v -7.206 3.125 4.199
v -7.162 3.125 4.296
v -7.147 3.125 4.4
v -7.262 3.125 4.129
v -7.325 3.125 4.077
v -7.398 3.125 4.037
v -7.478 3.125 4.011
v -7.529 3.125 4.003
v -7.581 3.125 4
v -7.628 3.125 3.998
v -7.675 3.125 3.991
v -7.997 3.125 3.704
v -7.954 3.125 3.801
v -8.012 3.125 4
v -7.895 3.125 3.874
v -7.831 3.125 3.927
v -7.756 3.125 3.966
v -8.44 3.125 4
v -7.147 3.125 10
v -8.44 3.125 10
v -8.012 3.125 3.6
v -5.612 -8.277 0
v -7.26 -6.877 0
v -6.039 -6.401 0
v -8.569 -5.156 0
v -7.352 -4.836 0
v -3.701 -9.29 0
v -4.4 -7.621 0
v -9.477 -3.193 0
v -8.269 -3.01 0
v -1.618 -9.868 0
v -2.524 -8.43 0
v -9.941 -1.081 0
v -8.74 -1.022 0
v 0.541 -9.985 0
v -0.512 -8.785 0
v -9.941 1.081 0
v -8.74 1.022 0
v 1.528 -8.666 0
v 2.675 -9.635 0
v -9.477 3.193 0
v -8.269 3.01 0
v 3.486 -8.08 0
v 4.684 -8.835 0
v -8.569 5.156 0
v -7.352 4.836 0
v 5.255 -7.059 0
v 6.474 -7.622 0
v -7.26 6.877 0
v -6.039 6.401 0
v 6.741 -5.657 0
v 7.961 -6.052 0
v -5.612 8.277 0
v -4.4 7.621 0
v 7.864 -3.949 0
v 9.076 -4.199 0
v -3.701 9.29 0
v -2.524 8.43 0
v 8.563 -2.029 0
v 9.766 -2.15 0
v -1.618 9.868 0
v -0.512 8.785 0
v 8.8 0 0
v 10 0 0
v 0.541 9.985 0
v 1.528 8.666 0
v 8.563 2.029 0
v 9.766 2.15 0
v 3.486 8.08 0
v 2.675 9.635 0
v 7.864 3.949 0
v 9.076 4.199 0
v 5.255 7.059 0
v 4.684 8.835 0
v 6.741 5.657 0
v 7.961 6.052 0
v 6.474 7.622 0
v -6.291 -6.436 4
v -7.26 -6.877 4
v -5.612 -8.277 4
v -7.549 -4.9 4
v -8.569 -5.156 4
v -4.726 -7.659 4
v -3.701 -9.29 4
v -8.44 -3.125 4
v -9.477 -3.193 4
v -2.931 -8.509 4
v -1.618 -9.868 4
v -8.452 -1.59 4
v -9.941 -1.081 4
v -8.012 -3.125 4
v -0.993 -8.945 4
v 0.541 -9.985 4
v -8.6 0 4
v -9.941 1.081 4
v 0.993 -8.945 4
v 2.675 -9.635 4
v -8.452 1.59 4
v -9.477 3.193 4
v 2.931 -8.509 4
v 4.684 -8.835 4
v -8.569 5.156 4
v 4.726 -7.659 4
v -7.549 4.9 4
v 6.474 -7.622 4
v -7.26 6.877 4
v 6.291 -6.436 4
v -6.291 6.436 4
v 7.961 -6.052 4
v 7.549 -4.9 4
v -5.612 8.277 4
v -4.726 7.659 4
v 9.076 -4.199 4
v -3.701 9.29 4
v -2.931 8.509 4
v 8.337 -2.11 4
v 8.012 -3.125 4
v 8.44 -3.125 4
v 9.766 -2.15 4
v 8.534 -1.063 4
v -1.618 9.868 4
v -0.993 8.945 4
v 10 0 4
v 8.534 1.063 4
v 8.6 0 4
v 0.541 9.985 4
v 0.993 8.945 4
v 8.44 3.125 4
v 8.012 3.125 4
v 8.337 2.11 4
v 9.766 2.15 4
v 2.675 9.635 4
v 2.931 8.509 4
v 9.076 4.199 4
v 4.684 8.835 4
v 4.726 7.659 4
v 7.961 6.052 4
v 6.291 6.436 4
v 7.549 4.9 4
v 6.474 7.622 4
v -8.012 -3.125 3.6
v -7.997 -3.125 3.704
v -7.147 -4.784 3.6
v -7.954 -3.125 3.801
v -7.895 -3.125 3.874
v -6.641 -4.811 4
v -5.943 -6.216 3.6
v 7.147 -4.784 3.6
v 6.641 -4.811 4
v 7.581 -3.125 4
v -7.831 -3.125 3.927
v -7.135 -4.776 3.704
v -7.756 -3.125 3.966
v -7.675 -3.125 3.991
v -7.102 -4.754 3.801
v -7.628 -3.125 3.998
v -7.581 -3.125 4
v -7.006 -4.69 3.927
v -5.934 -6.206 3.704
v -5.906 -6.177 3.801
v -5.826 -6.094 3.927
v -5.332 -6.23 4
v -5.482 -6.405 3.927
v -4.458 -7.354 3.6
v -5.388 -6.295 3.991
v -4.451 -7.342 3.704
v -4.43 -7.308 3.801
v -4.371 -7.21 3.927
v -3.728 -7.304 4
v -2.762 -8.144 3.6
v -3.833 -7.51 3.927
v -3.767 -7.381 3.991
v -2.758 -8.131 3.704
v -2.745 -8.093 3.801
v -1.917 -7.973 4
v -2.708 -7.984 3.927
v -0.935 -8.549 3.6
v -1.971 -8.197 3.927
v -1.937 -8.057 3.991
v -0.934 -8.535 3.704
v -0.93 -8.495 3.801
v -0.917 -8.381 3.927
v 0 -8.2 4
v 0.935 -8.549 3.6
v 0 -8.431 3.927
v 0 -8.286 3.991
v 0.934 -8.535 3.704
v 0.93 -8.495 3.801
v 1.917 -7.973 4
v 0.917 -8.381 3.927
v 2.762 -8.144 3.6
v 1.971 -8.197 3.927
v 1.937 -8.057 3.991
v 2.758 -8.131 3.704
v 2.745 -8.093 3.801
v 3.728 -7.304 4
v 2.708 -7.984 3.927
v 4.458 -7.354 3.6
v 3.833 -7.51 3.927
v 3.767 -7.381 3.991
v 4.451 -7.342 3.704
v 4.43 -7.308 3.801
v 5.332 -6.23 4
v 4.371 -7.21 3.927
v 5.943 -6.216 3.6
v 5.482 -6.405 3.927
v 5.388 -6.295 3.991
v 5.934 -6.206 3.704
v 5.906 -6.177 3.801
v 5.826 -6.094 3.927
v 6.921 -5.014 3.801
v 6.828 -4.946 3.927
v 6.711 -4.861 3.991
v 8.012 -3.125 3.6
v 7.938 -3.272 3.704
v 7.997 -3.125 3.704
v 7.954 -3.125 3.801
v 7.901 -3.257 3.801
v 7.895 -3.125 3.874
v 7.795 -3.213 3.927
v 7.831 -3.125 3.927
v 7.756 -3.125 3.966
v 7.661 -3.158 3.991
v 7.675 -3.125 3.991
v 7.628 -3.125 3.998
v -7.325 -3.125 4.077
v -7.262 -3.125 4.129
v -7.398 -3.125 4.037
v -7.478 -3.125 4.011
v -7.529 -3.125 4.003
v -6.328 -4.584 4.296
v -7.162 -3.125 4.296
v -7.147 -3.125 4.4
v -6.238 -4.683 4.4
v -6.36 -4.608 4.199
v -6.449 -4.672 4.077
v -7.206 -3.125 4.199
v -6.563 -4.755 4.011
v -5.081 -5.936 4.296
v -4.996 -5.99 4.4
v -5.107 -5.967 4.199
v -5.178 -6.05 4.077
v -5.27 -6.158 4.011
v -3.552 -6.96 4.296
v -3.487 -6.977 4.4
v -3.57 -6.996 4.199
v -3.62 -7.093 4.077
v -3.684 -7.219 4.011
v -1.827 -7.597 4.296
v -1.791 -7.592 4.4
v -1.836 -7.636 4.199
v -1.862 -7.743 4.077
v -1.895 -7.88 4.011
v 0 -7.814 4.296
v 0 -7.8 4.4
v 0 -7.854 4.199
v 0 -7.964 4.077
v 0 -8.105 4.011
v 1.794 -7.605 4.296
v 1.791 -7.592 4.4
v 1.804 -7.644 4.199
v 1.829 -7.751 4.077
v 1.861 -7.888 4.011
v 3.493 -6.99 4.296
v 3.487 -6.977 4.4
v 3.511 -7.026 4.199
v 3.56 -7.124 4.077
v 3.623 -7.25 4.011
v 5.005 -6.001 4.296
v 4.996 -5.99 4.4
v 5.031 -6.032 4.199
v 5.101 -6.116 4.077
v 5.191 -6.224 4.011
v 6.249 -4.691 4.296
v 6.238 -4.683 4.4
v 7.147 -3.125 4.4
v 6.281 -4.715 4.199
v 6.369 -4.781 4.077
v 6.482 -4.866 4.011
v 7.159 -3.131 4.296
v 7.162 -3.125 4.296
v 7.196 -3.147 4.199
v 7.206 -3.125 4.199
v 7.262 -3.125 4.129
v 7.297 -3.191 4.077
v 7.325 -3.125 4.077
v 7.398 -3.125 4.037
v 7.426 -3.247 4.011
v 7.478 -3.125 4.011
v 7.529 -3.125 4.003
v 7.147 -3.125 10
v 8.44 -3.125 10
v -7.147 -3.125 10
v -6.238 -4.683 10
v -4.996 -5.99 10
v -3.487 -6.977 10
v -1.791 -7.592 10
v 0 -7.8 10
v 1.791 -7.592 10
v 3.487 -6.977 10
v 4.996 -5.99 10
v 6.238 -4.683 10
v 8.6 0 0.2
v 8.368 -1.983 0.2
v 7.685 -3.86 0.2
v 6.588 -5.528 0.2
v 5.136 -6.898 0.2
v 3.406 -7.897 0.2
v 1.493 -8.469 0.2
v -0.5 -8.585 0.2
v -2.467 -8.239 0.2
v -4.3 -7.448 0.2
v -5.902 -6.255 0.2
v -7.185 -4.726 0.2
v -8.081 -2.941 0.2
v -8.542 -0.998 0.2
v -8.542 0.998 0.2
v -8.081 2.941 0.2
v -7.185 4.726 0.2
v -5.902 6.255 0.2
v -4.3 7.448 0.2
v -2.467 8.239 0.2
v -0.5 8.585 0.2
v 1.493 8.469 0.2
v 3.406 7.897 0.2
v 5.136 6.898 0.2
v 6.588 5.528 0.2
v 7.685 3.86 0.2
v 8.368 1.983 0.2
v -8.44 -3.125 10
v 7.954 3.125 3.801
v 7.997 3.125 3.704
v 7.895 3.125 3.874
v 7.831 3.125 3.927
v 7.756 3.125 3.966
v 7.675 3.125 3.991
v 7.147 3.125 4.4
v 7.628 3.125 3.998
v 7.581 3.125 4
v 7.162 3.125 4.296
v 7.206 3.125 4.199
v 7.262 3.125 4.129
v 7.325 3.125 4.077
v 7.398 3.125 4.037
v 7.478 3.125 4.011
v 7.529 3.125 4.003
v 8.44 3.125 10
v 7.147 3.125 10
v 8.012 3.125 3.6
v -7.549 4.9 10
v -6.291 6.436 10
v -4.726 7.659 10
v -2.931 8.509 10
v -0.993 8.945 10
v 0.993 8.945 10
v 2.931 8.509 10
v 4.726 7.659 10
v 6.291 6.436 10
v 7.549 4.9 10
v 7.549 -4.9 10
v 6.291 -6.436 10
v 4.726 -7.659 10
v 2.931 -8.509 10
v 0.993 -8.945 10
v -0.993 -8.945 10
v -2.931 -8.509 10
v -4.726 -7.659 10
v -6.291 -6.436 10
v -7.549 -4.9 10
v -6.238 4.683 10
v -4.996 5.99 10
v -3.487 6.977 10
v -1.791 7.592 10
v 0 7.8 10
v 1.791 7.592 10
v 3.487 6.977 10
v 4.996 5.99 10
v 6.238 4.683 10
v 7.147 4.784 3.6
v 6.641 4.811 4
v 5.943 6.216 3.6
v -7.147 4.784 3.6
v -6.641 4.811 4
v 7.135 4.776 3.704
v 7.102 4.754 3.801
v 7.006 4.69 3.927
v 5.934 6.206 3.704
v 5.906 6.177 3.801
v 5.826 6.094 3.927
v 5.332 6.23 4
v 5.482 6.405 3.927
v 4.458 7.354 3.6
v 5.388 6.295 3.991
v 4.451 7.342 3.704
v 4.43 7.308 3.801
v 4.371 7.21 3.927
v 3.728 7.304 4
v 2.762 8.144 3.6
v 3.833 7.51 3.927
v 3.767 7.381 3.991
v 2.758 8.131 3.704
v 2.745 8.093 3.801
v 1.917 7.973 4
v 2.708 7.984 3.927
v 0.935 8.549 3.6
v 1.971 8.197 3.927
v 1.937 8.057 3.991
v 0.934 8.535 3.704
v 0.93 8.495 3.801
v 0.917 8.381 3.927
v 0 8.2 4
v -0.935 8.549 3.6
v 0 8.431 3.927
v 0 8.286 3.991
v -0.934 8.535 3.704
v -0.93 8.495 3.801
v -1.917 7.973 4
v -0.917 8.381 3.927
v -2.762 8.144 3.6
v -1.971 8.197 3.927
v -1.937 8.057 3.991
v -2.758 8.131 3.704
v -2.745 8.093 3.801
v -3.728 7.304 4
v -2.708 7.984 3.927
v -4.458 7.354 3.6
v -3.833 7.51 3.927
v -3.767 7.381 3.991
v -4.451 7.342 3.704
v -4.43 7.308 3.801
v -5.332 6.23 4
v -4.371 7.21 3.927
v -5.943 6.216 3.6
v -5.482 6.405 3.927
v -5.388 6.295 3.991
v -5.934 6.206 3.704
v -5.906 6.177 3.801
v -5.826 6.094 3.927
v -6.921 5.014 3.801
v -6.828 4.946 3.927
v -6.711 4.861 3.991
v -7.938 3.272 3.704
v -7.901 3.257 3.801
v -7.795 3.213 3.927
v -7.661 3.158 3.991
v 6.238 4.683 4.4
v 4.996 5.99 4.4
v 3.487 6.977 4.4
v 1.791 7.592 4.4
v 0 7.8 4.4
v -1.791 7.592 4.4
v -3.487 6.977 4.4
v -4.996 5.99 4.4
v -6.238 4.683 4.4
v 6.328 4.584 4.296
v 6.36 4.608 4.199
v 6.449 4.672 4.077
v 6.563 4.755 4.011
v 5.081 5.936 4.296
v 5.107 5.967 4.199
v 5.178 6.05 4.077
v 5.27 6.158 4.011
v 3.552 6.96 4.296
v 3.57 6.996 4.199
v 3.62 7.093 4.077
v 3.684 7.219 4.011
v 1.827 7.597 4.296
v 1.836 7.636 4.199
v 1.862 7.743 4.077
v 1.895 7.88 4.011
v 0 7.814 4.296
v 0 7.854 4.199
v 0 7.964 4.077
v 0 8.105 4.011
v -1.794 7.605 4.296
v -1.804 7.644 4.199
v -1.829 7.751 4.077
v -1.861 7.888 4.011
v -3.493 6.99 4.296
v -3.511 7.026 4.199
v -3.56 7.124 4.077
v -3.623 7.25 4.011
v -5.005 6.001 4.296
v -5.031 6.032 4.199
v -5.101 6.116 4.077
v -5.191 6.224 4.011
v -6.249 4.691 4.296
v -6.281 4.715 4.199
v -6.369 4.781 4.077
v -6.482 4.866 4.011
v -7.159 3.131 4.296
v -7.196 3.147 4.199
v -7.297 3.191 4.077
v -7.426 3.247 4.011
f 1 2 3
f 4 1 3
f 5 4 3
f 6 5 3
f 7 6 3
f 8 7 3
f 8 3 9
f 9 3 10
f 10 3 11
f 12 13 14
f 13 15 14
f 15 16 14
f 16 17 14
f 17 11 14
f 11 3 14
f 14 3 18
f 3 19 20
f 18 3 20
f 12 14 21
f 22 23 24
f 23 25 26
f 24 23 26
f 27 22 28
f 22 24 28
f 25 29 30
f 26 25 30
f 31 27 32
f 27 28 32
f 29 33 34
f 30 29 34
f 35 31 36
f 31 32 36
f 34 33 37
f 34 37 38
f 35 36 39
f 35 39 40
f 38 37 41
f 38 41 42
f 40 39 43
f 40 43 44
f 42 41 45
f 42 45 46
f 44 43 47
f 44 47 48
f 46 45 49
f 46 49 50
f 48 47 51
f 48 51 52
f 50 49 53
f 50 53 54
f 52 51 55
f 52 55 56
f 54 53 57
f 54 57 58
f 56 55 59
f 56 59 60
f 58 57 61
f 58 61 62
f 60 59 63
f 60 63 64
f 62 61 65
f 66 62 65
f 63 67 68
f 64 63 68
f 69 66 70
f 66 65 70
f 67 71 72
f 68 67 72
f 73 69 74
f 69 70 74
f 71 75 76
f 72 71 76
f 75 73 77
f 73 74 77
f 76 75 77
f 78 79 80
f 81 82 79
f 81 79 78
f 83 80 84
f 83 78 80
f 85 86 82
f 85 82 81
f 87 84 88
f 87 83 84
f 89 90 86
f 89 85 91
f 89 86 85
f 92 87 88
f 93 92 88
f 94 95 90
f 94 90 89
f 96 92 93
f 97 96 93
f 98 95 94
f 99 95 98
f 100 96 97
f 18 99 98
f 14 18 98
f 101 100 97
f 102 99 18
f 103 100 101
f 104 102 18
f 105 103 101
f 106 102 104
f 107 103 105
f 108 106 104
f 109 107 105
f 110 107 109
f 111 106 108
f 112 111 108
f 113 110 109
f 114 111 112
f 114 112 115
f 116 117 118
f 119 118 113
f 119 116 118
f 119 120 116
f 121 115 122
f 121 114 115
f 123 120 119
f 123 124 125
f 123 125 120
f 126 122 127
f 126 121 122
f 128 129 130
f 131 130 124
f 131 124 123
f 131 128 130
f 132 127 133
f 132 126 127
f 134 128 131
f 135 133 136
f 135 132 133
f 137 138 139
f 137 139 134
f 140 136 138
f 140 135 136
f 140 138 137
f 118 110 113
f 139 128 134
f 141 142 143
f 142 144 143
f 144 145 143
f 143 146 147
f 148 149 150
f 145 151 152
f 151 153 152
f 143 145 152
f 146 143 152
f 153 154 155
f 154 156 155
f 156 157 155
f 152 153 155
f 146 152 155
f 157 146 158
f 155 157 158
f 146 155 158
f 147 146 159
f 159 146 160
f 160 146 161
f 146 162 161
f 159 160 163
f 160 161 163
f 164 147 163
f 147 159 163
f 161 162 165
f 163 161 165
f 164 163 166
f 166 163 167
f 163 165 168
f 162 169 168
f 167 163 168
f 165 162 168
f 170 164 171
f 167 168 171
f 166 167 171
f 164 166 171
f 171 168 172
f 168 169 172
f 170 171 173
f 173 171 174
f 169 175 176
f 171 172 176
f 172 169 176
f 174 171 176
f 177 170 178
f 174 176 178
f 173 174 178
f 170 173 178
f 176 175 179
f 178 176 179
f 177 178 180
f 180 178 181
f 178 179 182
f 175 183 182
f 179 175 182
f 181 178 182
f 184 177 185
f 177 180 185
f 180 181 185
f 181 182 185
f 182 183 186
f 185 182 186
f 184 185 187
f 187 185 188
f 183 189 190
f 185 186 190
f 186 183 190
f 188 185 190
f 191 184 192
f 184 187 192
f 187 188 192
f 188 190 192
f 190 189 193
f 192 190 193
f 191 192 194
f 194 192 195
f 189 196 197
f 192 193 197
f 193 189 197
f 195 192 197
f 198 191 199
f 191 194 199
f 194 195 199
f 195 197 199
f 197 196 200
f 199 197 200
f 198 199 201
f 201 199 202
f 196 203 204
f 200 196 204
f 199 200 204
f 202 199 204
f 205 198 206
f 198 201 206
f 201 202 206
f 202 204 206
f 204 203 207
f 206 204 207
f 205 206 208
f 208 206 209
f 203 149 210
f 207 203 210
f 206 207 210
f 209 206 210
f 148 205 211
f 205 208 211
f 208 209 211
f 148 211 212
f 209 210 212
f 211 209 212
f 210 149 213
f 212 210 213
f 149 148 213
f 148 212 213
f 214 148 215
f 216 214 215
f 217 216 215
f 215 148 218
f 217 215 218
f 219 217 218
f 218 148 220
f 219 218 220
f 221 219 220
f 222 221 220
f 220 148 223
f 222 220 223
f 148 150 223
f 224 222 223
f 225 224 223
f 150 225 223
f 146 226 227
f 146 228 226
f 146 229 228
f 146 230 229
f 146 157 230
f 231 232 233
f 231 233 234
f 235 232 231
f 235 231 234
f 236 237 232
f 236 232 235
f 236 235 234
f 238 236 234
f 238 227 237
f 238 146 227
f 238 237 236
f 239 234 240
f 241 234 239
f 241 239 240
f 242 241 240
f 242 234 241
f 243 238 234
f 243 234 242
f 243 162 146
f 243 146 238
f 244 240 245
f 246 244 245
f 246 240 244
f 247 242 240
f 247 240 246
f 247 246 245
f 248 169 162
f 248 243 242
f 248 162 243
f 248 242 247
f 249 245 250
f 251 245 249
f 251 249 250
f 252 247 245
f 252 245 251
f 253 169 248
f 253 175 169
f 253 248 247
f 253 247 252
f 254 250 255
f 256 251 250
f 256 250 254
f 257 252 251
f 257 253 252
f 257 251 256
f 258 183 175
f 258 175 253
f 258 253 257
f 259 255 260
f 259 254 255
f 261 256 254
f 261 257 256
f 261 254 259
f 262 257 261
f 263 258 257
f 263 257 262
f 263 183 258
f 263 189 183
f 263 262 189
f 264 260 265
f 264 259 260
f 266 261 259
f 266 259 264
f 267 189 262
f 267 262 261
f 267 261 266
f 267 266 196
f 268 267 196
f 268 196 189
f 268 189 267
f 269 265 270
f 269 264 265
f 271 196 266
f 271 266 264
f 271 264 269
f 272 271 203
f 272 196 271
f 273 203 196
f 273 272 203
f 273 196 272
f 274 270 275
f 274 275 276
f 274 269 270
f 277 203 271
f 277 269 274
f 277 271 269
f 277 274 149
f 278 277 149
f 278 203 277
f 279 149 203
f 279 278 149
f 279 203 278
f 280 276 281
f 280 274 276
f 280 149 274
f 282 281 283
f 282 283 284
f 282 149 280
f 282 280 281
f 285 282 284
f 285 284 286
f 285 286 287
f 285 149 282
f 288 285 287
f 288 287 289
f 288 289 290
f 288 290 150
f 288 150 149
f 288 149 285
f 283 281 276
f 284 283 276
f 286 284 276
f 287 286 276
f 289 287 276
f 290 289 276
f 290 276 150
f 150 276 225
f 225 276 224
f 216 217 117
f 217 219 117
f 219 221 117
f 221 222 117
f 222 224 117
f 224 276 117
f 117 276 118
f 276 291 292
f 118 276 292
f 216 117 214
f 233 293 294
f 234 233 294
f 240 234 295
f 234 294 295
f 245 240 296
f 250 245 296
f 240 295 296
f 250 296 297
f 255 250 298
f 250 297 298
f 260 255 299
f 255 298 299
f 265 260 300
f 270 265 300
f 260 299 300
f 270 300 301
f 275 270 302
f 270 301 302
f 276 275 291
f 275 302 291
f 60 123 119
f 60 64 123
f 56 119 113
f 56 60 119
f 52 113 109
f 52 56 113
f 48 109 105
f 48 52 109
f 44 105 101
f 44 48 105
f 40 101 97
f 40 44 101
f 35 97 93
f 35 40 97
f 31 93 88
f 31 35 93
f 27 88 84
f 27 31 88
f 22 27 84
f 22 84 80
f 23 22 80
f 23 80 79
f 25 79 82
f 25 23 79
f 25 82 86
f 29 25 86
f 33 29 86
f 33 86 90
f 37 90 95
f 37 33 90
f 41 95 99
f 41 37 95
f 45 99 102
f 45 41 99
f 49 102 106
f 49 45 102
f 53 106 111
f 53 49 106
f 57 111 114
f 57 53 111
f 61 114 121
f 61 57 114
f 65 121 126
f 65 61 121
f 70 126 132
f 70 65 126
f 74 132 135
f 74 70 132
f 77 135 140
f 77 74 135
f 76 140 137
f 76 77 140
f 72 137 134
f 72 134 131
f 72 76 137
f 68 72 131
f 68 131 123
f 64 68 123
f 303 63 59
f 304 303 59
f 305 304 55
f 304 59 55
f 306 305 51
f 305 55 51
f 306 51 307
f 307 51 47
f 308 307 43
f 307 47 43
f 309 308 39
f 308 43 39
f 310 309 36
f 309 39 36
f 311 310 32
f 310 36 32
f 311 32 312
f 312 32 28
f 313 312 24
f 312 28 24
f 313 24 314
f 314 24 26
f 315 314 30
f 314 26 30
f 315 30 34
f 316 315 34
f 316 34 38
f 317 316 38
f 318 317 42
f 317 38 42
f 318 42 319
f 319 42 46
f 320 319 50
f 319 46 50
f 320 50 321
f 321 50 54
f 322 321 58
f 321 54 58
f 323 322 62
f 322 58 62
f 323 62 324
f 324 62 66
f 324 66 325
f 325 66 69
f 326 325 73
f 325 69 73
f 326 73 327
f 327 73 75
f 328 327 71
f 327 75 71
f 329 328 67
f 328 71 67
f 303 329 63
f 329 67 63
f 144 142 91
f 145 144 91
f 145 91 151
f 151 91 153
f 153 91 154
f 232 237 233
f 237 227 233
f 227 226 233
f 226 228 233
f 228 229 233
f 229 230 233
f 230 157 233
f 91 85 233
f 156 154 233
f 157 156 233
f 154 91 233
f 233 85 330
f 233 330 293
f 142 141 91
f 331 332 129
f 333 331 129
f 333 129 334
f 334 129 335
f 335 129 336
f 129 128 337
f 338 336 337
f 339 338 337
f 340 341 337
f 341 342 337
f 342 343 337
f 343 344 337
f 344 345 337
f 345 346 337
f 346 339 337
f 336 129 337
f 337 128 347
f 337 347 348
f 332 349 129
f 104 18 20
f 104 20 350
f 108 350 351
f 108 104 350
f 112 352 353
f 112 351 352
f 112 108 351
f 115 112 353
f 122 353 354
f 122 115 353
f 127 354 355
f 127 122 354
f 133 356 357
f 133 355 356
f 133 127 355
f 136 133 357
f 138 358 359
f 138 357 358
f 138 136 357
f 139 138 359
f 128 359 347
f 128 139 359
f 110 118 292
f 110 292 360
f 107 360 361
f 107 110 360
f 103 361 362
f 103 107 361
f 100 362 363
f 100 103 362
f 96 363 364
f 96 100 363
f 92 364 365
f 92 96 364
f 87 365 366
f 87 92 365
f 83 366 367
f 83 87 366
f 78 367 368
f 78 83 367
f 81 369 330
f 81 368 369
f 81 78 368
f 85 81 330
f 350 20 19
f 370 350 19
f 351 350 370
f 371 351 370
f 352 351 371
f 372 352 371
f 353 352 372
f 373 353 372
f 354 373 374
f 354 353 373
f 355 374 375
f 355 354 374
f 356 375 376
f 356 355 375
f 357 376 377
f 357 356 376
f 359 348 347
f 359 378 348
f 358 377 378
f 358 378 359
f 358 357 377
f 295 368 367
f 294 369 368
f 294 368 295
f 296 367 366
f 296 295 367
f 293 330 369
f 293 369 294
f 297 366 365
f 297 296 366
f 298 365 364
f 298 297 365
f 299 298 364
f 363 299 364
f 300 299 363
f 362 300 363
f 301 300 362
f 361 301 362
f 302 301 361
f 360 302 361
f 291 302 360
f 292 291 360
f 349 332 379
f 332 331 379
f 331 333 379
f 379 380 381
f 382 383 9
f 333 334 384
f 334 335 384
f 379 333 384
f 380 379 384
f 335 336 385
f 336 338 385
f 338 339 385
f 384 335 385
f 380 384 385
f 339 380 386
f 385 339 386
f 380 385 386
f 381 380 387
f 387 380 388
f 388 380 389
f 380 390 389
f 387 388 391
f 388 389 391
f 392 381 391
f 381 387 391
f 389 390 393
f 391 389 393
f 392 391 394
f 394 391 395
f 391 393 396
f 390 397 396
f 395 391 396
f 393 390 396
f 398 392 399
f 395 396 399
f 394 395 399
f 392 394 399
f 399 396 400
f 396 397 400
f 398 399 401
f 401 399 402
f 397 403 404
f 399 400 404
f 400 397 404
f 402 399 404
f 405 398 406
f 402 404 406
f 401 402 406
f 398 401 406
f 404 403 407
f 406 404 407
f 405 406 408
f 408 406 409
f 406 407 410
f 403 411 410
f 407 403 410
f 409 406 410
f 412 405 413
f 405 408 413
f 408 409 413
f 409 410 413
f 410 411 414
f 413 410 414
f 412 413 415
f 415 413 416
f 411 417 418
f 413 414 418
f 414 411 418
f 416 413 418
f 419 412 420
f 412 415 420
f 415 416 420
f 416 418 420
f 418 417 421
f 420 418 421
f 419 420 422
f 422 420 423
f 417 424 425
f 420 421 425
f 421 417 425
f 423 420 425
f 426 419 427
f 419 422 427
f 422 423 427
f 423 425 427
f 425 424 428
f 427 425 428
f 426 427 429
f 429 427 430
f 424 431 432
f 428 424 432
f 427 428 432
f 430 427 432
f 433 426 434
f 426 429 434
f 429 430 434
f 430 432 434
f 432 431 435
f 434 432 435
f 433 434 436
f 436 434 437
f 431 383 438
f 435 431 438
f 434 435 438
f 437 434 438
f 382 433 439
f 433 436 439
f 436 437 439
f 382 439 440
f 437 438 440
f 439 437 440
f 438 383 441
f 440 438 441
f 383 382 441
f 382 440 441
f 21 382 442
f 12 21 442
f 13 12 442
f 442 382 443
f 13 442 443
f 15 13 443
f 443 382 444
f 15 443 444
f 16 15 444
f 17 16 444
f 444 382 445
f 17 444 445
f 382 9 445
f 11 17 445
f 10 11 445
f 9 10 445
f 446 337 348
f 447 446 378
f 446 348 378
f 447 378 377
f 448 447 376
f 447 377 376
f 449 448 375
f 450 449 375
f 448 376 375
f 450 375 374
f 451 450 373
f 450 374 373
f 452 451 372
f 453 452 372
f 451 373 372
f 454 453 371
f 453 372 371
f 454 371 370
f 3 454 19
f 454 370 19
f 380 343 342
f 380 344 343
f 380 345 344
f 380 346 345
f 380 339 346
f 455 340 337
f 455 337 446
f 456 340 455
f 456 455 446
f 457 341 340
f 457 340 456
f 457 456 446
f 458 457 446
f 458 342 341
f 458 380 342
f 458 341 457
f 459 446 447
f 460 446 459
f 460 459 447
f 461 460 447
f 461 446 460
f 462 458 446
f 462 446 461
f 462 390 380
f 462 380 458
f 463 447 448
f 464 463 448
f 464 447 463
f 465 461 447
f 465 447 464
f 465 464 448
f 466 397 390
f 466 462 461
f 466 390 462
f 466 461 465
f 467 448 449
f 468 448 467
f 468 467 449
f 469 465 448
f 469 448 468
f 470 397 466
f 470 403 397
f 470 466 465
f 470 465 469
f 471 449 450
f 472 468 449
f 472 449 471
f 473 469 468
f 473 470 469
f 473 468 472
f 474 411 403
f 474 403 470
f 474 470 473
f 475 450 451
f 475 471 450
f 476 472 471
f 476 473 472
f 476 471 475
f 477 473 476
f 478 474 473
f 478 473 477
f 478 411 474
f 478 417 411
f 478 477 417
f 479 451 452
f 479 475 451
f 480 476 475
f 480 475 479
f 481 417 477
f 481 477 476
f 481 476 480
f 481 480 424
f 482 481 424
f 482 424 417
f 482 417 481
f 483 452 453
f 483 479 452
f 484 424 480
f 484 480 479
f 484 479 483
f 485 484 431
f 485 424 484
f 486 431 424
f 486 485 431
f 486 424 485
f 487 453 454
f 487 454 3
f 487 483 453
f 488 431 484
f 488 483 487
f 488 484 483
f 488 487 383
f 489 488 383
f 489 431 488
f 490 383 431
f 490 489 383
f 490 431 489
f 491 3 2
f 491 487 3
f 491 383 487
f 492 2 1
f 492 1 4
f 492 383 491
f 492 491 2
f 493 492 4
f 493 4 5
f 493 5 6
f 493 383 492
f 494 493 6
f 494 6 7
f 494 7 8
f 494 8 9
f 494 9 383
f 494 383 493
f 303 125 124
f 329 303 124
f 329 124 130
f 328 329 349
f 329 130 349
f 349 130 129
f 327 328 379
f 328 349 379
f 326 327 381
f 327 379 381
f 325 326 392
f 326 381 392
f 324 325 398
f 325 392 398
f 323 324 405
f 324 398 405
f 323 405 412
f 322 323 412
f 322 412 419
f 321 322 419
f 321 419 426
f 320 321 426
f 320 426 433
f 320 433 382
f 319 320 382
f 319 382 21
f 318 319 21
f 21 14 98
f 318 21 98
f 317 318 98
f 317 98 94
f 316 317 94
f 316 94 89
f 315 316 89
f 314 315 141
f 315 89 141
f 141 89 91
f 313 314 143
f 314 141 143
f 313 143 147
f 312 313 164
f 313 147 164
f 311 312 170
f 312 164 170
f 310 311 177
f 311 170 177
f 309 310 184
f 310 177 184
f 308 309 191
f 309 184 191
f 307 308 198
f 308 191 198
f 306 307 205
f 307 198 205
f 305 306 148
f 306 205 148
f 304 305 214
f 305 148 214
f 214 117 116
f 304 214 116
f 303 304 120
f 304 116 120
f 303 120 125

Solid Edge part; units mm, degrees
sketch "Sketch1" plane through (0, 0, 0) normal (0, -1, 0) x (1, 0, 0)
  line L0 (10, 4) -> (10, 0)
  line L1 (10, 0) -> (8.6, 0)
  line L2 (8.6, 0) -> (8.6, 4)
  line L3 (8.6, 4) -> (7.8, 4)
  line L4 (7.8, 4) -> (7.8, 10)
  line L5 (7.8, 10) -> (9, 10)
  line L6 (9, 10) -> (9, 4)
  line L7 (9, 4) -> (10, 4)
revolve "RevolvedProtrusion1" add sketch "Sketch1" angle 360 about axis through (0, 0, 0) along (0, 0, 1)
sketch "Sketch2" plane through (0, 0, 10) normal (0, 0, 1) x (1, 0, 0)
  line L0 (-13.844, -3.125) -> (13.844, -3.125)
  line L1 (13.844, -3.125) -> (13.844, 3.125)
  line L2 (13.844, 3.125) -> (-13.844, 3.125)
  line L3 (-13.844, 3.125) -> (-13.844, -3.125)
extrude "Cutout1" cut sketch "Sketch2" against normal up to surface (6 mm away)
fillet "Round1" radius 0.4 4 edges at (0, 8.6, 4) (0, -8.6, 4) (0, -7.8, 4) (0, 7.8, 4)
chamfer "Chaflán_1" distance 0.2 angle 45 1 edges at (-8.6, 0, 0)
